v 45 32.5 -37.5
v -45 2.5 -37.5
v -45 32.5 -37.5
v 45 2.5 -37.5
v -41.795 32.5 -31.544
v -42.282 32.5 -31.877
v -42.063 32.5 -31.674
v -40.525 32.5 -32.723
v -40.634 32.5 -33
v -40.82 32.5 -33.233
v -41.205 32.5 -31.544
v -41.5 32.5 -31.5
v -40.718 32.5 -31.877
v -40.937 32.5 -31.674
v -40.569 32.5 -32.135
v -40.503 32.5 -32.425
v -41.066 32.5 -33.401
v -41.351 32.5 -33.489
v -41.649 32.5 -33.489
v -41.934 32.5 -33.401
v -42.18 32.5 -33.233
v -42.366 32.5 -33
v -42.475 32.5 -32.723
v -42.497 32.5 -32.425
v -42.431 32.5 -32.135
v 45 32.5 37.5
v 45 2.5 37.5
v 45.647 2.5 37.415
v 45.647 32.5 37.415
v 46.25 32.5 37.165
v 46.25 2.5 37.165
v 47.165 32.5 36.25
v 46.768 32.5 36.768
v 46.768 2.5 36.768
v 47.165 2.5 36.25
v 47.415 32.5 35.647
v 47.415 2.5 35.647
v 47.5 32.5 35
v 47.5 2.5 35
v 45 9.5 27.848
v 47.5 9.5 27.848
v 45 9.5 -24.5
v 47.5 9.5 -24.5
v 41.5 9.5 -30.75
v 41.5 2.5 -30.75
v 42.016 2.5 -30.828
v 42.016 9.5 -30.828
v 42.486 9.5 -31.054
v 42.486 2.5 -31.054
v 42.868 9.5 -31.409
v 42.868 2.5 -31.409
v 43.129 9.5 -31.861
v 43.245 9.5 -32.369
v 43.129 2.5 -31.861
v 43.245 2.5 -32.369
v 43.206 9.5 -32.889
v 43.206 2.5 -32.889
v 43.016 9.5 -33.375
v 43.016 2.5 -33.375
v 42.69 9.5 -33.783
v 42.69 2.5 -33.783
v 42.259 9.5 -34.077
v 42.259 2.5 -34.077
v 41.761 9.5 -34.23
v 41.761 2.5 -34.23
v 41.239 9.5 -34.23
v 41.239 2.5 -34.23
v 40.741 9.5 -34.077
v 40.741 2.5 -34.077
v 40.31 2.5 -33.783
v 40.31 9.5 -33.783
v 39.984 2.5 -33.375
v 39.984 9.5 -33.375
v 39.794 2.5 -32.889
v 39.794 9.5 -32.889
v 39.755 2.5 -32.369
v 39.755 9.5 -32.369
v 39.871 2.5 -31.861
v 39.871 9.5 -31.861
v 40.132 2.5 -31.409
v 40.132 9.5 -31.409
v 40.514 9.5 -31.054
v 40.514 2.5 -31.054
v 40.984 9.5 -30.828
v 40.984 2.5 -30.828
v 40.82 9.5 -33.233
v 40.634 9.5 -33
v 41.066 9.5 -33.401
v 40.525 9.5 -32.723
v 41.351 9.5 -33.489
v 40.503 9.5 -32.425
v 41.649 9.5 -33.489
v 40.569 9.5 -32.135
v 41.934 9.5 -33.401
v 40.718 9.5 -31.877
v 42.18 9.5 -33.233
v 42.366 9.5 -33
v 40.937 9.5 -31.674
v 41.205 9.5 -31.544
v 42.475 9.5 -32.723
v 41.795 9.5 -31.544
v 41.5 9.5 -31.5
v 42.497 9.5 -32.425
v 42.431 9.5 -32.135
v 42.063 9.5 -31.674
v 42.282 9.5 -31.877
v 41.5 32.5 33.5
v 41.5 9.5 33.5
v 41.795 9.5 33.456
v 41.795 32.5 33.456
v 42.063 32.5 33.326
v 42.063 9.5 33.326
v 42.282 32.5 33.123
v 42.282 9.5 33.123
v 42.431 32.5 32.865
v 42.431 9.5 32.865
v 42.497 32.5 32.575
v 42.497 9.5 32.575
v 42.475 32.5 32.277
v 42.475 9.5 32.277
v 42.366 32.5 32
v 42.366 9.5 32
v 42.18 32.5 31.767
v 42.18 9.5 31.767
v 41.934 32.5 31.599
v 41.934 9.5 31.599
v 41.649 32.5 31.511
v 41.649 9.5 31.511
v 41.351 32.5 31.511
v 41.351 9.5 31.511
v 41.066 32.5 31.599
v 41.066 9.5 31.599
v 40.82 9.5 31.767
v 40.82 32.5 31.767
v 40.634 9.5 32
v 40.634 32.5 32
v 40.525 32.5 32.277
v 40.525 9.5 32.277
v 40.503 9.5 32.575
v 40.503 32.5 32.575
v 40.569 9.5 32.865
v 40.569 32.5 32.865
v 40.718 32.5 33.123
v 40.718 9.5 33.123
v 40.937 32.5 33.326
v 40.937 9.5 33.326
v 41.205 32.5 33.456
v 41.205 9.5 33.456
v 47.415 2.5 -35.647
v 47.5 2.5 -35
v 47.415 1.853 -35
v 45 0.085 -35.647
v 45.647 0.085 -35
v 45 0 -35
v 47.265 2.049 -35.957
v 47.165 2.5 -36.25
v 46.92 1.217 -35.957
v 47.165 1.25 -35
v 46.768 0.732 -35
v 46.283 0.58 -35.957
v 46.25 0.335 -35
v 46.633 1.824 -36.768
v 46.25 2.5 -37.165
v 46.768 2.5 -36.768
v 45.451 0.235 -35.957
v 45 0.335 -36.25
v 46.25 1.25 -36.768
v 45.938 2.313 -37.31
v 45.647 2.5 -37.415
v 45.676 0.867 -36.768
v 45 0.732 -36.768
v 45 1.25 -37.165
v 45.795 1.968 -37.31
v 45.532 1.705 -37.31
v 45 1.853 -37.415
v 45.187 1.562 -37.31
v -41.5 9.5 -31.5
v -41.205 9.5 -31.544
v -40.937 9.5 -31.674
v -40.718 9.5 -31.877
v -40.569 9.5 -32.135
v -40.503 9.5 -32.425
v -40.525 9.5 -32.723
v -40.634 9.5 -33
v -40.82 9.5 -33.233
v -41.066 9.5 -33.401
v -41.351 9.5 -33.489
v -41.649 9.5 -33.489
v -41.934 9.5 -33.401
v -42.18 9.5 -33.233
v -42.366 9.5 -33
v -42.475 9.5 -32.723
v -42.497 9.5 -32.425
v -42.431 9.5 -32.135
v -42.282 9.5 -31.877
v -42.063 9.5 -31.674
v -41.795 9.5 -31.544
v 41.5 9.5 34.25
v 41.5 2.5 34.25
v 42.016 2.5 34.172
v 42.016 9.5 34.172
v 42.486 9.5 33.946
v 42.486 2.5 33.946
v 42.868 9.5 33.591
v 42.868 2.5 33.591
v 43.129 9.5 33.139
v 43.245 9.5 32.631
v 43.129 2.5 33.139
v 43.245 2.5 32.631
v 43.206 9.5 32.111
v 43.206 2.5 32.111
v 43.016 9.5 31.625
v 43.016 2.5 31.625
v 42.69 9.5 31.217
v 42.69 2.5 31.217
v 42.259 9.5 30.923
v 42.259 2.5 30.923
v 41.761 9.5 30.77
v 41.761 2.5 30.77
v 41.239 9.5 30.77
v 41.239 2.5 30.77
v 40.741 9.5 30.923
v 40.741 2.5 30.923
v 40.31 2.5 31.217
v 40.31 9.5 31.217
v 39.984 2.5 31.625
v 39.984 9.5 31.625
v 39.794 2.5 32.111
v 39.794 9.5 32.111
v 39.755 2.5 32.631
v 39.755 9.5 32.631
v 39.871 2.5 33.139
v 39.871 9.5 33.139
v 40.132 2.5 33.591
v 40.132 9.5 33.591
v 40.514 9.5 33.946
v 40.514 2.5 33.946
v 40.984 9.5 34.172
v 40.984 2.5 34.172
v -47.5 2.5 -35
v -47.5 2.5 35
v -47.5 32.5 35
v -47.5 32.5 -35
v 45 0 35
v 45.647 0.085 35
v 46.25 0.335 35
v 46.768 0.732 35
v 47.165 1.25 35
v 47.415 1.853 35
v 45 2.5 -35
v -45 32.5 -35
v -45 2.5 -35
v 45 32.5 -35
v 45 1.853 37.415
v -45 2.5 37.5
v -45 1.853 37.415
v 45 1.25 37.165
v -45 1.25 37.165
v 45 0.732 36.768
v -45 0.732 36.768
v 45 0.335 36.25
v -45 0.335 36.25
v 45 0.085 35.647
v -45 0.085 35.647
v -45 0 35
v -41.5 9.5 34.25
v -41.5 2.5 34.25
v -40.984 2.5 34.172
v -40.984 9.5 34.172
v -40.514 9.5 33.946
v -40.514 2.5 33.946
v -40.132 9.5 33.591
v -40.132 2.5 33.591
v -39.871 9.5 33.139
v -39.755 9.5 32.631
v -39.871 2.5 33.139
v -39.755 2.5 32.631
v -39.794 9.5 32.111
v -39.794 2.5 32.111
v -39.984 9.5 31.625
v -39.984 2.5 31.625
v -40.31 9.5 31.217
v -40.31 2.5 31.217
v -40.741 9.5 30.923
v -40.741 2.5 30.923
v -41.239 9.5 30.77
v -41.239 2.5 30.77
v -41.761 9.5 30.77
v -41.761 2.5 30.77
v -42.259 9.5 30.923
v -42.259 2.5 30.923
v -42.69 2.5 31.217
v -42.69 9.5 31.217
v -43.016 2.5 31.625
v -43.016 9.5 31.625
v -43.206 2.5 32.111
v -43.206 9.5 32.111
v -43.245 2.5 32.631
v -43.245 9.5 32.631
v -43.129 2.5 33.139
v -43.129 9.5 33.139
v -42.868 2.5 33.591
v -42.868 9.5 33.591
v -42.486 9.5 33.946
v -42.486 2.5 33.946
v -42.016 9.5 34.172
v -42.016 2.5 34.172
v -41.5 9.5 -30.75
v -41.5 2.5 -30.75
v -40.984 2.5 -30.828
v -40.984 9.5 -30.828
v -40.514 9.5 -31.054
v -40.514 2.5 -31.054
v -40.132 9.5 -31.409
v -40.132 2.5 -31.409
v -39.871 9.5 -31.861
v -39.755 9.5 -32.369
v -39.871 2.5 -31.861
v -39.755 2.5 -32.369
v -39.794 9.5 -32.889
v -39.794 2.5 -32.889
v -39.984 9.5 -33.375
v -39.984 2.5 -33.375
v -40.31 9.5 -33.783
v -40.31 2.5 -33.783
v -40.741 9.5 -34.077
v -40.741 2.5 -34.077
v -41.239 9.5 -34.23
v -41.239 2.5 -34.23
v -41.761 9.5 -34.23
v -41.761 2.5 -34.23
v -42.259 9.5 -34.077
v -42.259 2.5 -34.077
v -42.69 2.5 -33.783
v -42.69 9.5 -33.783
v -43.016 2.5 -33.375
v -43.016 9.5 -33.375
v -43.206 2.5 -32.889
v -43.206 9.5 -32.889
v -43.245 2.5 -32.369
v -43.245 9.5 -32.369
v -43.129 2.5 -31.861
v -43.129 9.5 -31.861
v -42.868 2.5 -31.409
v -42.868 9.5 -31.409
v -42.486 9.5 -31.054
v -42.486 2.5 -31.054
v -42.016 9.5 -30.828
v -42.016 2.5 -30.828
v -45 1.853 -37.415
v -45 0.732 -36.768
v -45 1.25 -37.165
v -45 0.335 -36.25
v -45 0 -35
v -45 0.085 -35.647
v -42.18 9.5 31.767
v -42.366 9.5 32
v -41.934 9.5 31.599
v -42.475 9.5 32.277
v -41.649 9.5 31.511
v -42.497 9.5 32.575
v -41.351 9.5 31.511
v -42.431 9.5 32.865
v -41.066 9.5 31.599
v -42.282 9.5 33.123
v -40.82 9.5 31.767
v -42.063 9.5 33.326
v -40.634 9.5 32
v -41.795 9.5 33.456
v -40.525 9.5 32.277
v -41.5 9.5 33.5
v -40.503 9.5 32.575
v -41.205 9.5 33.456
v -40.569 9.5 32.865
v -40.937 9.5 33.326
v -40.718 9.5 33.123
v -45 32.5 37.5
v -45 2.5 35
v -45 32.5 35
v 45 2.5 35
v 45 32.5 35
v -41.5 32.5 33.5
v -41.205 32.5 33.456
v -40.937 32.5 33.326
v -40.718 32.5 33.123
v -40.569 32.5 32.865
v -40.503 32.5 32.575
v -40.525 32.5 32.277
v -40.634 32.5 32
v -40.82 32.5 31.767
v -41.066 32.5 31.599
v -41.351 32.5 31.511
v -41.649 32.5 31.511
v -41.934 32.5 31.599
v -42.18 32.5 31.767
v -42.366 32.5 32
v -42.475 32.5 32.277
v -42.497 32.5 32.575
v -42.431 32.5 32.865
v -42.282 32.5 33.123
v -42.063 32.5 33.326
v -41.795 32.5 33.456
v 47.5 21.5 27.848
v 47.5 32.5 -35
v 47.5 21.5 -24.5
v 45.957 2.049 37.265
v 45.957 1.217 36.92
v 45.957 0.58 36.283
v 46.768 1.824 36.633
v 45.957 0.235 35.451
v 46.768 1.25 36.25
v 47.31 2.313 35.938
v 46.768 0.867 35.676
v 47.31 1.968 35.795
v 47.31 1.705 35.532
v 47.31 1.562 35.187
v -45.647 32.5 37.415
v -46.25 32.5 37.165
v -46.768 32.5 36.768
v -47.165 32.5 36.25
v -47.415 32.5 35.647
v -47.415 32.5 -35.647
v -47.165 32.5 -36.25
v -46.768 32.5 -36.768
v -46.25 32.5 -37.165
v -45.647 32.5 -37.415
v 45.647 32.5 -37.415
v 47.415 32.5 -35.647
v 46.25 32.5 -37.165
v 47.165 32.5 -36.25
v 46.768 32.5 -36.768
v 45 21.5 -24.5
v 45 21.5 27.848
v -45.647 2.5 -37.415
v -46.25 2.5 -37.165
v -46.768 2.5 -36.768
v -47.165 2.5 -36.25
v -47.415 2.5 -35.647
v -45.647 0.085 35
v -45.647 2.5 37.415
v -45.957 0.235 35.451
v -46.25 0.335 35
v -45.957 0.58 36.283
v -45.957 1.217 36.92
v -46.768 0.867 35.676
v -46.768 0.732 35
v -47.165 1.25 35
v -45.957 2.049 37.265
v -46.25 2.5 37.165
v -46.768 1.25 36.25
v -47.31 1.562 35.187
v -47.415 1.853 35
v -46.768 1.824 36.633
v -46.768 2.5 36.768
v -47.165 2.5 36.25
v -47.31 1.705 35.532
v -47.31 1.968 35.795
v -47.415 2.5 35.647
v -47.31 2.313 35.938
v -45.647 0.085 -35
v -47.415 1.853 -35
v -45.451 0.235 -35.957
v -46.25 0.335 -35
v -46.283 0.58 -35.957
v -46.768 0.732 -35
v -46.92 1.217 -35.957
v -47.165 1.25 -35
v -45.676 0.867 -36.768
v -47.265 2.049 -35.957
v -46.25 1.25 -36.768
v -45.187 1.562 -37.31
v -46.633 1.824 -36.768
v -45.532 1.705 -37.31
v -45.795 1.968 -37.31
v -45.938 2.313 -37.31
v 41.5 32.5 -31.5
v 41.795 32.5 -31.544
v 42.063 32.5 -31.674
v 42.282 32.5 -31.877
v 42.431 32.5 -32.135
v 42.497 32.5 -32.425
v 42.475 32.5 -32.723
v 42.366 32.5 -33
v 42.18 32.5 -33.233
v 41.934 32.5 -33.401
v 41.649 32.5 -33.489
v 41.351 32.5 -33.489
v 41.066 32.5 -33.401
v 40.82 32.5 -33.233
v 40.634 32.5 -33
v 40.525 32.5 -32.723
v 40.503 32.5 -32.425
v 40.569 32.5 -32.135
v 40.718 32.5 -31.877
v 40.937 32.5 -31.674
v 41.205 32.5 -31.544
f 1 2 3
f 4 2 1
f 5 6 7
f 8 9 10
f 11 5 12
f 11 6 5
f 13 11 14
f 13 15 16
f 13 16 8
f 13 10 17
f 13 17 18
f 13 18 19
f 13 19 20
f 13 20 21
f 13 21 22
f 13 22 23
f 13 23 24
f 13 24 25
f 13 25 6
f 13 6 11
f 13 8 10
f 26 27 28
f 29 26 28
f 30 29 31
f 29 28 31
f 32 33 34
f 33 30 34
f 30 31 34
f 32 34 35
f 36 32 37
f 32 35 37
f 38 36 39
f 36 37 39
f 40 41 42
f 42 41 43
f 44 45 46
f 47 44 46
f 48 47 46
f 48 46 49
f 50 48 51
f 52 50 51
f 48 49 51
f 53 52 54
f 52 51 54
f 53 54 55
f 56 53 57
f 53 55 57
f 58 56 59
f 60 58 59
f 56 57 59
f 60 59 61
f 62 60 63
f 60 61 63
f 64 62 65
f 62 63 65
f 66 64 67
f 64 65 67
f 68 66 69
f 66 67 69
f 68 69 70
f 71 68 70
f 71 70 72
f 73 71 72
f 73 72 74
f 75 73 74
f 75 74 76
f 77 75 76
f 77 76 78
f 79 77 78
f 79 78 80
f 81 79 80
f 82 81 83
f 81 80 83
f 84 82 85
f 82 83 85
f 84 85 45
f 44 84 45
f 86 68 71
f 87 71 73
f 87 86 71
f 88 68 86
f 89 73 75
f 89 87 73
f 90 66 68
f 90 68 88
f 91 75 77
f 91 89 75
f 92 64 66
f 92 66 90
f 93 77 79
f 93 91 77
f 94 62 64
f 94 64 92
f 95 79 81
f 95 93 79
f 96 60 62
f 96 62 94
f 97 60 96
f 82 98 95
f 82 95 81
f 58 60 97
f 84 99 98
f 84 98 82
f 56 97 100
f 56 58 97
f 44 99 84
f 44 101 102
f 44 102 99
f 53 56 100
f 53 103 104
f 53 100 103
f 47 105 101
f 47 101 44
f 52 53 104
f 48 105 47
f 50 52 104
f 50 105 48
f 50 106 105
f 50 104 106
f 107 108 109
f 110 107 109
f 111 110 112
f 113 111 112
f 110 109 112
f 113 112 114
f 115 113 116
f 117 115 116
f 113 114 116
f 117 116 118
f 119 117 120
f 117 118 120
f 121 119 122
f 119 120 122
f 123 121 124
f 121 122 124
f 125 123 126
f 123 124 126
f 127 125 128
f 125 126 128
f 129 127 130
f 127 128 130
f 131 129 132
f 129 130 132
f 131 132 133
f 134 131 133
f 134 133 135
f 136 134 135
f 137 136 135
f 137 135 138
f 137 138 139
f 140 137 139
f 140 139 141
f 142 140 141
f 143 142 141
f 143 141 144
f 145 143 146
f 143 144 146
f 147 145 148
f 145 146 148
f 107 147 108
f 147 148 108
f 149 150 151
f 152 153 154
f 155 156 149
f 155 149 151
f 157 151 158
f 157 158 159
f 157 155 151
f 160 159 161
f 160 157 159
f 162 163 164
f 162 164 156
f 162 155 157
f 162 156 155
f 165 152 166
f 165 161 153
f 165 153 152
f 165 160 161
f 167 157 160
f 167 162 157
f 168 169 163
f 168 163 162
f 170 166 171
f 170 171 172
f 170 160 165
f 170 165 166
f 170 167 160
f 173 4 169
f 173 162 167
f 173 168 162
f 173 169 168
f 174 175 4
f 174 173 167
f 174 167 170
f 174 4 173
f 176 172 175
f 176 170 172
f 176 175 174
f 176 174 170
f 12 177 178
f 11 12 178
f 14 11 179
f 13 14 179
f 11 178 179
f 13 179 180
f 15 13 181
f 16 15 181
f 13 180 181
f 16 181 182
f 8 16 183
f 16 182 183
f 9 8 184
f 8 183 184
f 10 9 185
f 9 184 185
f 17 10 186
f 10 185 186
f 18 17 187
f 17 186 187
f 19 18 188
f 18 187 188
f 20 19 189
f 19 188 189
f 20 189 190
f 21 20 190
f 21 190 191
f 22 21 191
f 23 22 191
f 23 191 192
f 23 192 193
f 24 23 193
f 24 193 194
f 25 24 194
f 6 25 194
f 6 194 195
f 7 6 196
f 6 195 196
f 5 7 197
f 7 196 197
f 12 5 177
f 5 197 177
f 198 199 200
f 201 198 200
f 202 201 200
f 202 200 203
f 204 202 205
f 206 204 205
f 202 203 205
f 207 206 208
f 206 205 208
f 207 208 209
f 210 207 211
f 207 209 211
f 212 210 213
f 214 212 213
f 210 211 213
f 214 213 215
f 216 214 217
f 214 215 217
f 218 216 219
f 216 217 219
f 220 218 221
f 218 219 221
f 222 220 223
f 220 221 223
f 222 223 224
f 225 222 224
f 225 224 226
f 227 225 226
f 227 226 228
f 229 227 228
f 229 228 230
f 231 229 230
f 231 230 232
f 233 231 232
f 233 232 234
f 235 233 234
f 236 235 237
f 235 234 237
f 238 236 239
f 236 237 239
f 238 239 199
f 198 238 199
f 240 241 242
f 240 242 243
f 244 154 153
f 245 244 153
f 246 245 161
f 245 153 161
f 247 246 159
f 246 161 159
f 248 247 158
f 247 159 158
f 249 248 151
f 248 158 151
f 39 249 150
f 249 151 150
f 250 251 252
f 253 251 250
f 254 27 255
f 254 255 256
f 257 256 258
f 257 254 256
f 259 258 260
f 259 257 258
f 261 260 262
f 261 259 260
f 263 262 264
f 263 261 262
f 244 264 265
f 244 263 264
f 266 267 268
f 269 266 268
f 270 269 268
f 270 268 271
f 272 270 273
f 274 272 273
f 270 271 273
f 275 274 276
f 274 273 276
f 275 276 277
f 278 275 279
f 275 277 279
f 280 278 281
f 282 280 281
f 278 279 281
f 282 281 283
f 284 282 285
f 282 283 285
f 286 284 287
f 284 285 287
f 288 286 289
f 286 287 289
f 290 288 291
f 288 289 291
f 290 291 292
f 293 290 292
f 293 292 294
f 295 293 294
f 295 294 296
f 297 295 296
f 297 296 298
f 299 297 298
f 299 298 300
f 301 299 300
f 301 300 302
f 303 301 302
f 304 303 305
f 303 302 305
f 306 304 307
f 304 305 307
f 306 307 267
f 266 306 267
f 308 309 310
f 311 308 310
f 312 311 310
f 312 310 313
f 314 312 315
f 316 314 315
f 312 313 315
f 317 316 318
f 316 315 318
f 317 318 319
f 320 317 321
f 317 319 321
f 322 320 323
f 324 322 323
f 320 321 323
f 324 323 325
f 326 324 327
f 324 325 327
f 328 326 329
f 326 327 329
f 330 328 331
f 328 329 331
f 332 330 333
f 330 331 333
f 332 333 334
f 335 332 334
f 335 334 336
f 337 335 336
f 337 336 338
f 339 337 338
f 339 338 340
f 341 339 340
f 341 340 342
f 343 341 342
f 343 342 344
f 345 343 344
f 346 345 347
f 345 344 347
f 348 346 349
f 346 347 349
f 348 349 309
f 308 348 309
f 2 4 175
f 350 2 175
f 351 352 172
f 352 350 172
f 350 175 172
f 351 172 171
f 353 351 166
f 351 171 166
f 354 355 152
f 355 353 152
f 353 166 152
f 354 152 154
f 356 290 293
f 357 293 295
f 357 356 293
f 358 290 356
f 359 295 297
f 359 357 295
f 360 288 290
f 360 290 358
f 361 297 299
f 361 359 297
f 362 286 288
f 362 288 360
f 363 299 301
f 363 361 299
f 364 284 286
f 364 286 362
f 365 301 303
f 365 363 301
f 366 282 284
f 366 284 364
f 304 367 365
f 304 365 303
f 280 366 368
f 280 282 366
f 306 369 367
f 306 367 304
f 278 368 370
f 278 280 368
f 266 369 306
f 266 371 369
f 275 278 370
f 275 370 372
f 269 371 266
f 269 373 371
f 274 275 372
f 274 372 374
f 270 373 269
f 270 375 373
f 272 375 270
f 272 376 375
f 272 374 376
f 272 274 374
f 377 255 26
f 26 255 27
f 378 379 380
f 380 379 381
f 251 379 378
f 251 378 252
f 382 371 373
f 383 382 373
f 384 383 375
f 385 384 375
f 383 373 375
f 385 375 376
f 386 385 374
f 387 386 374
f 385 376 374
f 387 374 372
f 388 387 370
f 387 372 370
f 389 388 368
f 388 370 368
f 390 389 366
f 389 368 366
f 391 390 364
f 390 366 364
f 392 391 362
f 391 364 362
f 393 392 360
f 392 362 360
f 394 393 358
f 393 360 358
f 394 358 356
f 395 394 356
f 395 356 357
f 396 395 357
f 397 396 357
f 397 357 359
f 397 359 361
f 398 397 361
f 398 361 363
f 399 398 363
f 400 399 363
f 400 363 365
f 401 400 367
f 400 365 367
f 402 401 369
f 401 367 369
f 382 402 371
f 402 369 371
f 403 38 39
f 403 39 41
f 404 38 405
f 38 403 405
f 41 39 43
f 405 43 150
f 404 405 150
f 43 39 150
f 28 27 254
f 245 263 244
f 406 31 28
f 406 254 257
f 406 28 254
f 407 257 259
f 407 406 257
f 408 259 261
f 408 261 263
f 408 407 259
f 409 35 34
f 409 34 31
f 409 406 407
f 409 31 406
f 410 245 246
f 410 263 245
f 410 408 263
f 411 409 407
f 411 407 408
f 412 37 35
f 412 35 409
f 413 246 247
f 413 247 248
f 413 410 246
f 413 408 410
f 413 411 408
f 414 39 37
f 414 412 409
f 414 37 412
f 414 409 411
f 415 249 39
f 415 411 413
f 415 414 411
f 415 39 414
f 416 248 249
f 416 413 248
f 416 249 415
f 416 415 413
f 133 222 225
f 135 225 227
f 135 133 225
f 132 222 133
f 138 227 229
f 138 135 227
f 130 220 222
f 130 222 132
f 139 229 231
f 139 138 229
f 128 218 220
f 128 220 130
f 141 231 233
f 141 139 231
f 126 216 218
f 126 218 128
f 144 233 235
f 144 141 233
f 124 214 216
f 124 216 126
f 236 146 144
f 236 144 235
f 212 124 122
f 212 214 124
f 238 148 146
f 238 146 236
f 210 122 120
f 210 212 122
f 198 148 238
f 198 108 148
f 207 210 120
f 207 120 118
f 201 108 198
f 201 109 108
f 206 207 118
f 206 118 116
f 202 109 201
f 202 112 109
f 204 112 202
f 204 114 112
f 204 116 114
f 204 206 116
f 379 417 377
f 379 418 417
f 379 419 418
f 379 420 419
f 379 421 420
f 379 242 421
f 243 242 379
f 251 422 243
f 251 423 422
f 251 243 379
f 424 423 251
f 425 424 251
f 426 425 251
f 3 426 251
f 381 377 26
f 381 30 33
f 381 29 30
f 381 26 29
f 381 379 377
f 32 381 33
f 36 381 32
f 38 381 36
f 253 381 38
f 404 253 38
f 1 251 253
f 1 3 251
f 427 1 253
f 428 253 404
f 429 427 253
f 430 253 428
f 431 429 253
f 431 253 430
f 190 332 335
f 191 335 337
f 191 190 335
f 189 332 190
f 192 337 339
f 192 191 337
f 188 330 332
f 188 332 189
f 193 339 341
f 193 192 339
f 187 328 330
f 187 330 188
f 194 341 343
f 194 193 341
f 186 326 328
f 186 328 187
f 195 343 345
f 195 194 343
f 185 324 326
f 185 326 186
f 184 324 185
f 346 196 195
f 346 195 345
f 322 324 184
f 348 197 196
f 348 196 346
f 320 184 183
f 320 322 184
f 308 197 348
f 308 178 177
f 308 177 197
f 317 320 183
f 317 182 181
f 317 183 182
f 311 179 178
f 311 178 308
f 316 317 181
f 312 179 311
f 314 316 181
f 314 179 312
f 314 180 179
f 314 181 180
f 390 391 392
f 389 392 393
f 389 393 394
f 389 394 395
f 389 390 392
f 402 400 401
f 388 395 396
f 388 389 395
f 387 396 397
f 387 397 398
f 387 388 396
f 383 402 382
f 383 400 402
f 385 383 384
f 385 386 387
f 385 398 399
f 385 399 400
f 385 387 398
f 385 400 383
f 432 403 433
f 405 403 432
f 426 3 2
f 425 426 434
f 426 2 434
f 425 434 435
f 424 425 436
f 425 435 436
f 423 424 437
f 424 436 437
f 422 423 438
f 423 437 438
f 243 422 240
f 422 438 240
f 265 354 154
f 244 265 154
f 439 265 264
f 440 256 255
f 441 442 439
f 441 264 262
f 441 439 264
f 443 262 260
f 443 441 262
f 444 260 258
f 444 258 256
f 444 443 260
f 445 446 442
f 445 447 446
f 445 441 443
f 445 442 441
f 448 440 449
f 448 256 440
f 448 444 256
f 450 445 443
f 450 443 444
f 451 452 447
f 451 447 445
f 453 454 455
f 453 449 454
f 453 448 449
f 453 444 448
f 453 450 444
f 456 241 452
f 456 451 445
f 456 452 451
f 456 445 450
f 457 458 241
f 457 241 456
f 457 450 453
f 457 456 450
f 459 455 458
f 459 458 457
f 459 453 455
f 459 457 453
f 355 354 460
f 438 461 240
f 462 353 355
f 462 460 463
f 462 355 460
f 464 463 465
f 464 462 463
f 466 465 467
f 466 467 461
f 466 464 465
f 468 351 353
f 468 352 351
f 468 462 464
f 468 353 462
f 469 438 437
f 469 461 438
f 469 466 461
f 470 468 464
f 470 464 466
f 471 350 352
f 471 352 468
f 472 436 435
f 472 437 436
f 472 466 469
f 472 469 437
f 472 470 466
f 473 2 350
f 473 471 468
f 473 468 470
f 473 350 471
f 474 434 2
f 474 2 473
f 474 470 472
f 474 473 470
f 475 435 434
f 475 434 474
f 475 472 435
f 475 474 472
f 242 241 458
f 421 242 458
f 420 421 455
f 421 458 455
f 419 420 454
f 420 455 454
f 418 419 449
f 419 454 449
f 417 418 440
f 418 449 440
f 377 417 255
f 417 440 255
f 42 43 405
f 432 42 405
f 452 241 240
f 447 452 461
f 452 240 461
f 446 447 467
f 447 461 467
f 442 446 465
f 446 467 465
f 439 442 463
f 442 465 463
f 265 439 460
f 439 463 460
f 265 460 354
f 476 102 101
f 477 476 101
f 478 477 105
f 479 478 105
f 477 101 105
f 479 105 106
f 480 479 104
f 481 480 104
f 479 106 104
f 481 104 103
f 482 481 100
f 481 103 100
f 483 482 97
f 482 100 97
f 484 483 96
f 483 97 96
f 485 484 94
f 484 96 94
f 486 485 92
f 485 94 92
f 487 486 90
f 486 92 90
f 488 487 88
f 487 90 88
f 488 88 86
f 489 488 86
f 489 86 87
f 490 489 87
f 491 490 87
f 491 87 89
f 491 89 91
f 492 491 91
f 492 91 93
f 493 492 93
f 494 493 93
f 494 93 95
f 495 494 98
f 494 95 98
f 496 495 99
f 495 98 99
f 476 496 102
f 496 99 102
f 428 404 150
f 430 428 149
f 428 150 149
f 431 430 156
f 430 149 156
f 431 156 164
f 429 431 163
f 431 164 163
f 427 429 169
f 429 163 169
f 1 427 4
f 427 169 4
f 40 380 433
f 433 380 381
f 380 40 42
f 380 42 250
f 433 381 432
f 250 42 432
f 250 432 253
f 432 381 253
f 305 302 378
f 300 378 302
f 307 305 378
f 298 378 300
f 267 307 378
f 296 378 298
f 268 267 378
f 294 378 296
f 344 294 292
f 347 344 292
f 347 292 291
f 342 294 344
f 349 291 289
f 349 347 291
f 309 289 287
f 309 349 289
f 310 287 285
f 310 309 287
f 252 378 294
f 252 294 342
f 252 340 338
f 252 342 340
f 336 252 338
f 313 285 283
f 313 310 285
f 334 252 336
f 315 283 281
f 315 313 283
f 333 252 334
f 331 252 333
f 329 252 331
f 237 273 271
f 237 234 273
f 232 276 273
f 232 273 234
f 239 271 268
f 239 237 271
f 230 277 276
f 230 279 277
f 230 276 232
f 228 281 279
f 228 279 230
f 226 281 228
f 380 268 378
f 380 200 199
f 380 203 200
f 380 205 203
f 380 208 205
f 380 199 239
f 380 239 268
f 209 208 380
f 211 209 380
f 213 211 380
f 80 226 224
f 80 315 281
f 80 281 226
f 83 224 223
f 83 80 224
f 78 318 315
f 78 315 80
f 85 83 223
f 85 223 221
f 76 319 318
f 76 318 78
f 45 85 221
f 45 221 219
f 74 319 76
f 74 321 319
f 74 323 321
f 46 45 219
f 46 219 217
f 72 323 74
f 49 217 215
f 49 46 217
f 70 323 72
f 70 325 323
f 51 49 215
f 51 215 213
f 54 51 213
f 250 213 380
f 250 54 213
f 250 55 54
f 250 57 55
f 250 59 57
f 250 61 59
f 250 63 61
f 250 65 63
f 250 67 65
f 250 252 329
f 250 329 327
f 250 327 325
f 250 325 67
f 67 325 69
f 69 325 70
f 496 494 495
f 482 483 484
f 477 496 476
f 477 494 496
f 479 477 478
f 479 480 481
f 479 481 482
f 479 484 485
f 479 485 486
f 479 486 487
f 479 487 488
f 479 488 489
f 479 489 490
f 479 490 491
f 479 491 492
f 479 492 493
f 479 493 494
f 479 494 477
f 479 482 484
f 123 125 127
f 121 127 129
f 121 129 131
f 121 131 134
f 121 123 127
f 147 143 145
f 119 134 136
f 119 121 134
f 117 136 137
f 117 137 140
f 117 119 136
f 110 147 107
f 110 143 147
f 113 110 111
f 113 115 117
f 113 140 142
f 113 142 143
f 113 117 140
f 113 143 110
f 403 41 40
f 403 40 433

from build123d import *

# Parameters (mm, degrees)
SKETCH1_W           = 95
SKETCH1_H           = 75
BOSS_EXTRUDE1_DEPTH = 32.5
SKETCH2_W           = 90
SKETCH2_H           = 70
CUT_EXTRUDE1_DEPTH  = 30
SKETCH3_R           = 1.75
BOSS_EXTRUDE2_DEPTH = 7
SKETCH4_R           = 1
BOSS_EXTRUDE3_DEPTH = 23
SKETCH5_W           = 52.348164398
SKETCH5_H           = 12
CUT_EXTRUDE2_DEPTH  = 7
FILLET1_R           = 2.5
FILLET2_R           = 2.5
FILLET3_R           = 2.5
FILLET4_R           = 2.5
FILLET5_R           = 2.5


with BuildPart() as part:
    # Sketch1 → Boss-Extrude1 (new body)
    with BuildSketch(Plane(origin=(0, 0, 0), x_dir=(1, 0, 0), z_dir=(0, 1, 0))):
        Rectangle(SKETCH1_W, SKETCH1_H)
    extrude(amount=BOSS_EXTRUDE1_DEPTH)

    # Sketch2 → Cut-Extrude1 (cut)
    with BuildSketch(Plane(origin=(0, 32.5, 0), x_dir=(1, 0, 0), z_dir=(0, 1, 0))):
        Rectangle(SKETCH2_W, SKETCH2_H)
    extrude(amount=-CUT_EXTRUDE1_DEPTH, mode=Mode.SUBTRACT)

    # Sketch3 → Boss-Extrude2 (add)
    with BuildSketch(Plane(origin=(0, 2.5, 0), x_dir=(1, 0, 0), z_dir=(0, 1, 0))):
        with Locations(Location((-41.5, 32.5, 0), (0, 0, 270))):
            Circle(SKETCH3_R)
        with Locations(Location((41.5, 32.5, 0), (0, 0, 270))):
            Circle(SKETCH3_R)
        with Locations(Location((41.5, -32.5, 0), (0, 0, 270))):
            Circle(SKETCH3_R)
        with Locations(Location((-41.5, -32.5, 0), (0, 0, 270))):
            Circle(SKETCH3_R)
    extrude(amount=BOSS_EXTRUDE2_DEPTH)

    # Sketch4 → Boss-Extrude3 (add)
    with BuildSketch(Plane(origin=(0, 9.5, 0), x_dir=(1, 0, 0), z_dir=(0, 1, 0))):
        with Locations(Location((-41.5, 32.5, 0), (0, 0, 270))):
            Circle(SKETCH4_R)
        with Locations(Location((41.5, 32.5, 0), (0, 0, 270))):
            Circle(SKETCH4_R)
        with Locations(Location((41.5, -32.5, 0), (0, 0, 270))):
            Circle(SKETCH4_R)
        with Locations(Location((-41.5, -32.5, 0), (0, 0, 270))):
            Circle(SKETCH4_R)
    extrude(amount=BOSS_EXTRUDE3_DEPTH)

    # Sketch5 → Cut-Extrude2 (cut)
    with BuildSketch(Plane(origin=(47.5, 0, 0), x_dir=(0, 0, -1), z_dir=(1, 0, 0))):
        with Locations((-1.674082199, 15.5)):
            Rectangle(SKETCH5_W, SKETCH5_H)
    extrude(amount=-CUT_EXTRUDE2_DEPTH, mode=Mode.SUBTRACT)

    # Fillet1
    fillet1_edges = [part.edges().sort_by_distance(p)[0] for p in [
        (0, 0, -37.5),
        (47.5, 0, 0),
        (0, 0, 37.5),
        (-47.5, 0, 0),
    ]]
    fillet(fillet1_edges, radius=FILLET1_R)

    # Fillet2
    # the kernel refuses this fillet: 2.5 mm, written as the material it takes off along each edge
    with BuildSketch(Plane(origin=(45, 2.5, 35), x_dir=(0, 0, 1), z_dir=(1, 0, 0))) as fillet2_piece_1_section:
        Polygon((0, 0), (FILLET2_R, 0), (FILLET2_R, FILLET2_R), (0, FILLET2_R), align=None)
    fillet2_piece_1 = extrude(amount=FILLET2_R, mode=Mode.PRIVATE)
    fillet2_piece_1 = fillet2_piece_1 - Plane(origin=(45, 2.5, 35), x_dir=(0, 0.7071067811865475, -0.7071067811865475), z_dir=(1, 0, 0)) * Sphere(FILLET2_R, mode=Mode.PRIVATE)
    add(fillet2_piece_1, mode=Mode.SUBTRACT)
    with BuildSketch(Plane(origin=(47.5, 2.5, 37.5), x_dir=(0, 0, -1), z_dir=(0, 1, 0))) as fillet2_piece_2:
        with BuildLine():
            CenterArc((FILLET2_R, FILLET2_R), FILLET2_R, 180, 90)
            Line((0, FILLET2_R), (0, 0))
            Line((0, 0), (FILLET2_R, 0))
        make_face()
    extrude(amount=36.25, mode=Mode.SUBTRACT)

    # Fillet3
    # the kernel refuses this fillet: 2.5 mm, written as the material it takes off along each edge
    with BuildSketch(Plane(origin=(45, 2.5, -35), x_dir=(1, 0, 0), z_dir=(0, 0, -1))) as fillet3_piece_1_section:
        Polygon((0, 0), (FILLET3_R, 0), (FILLET3_R, FILLET3_R), (0, FILLET3_R), align=None)
    fillet3_piece_1 = extrude(amount=FILLET3_R, mode=Mode.PRIVATE)
    fillet3_piece_1 = fillet3_piece_1 - Plane(origin=(45, 2.5, -35), x_dir=(-0.7071067811865475, 0.7071067811865475, 0), z_dir=(0, 0, -1)) * Sphere(FILLET3_R, mode=Mode.PRIVATE)
    add(fillet3_piece_1, mode=Mode.SUBTRACT)
    with BuildSketch(Plane(origin=(47.5, 2.5, -37.5), x_dir=(-1, 0, 0), z_dir=(0, 1, 0))) as fillet3_piece_2:
        with BuildLine():
            CenterArc((FILLET3_R, FILLET3_R), FILLET3_R, 180, 90)
            Line((0, FILLET3_R), (0, 0))
            Line((0, 0), (FILLET3_R, 0))
        make_face()
    extrude(amount=36.25, mode=Mode.SUBTRACT)

    # Fillet4
    # the kernel refuses this fillet: 2.5 mm, written as the material it takes off along each edge
    with BuildSketch(Plane(origin=(-45, 2.5, -35), x_dir=(-1, 0, 0), z_dir=(0, 0, -1))) as fillet4_piece_1_section:
        Polygon((0, 0), (FILLET4_R, 0), (FILLET4_R, -FILLET4_R), (0, -FILLET4_R), align=None)
    fillet4_piece_1 = extrude(amount=FILLET4_R, mode=Mode.PRIVATE)
    fillet4_piece_1 = fillet4_piece_1 - Plane(origin=(-45, 2.5, -35), x_dir=(0.7071067811865475, 0.7071067811865475, 0), z_dir=(0, 0, -1)) * Sphere(FILLET4_R, mode=Mode.PRIVATE)
    add(fillet4_piece_1, mode=Mode.SUBTRACT)
    with BuildSketch(Plane(origin=(-47.5, 2.5, -37.5), x_dir=(1, 0, 0), z_dir=(0, 1, 0))) as fillet4_piece_2:
        with BuildLine():
            CenterArc((FILLET4_R, -FILLET4_R), FILLET4_R, 90, 90)
            Line((0, -FILLET4_R), (0, 0))
            Line((0, 0), (FILLET4_R, 0))
        make_face()
    extrude(amount=36.25, mode=Mode.SUBTRACT)

    # Fillet5
    # the kernel refuses this fillet: 2.5 mm, written as the material it takes off along each edge
    with BuildSketch(Plane(origin=(-45, 2.5, 35), x_dir=(0, 0, 1), z_dir=(-1, 0, 0))) as fillet5_piece_1_section:
        Polygon((0, 0), (FILLET5_R, 0), (FILLET5_R, -FILLET5_R), (0, -FILLET5_R), align=None)
    fillet5_piece_1 = extrude(amount=FILLET5_R, mode=Mode.PRIVATE)
    fillet5_piece_1 = fillet5_piece_1 - Plane(origin=(-45, 2.5, 35), x_dir=(0, 0.7071067811865475, -0.7071067811865475), z_dir=(-1, 0, 0)) * Sphere(FILLET5_R, mode=Mode.PRIVATE)
    add(fillet5_piece_1, mode=Mode.SUBTRACT)
    with BuildSketch(Plane(origin=(-47.5, 2.5, 37.5), x_dir=(0, 0, -1), z_dir=(0, 1, 0))) as fillet5_piece_2:
        with BuildLine():
            CenterArc((FILLET5_R, -FILLET5_R), FILLET5_R, 90, 90)
            Line((0, -FILLET5_R), (0, 0))
            Line((0, 0), (FILLET5_R, 0))
        make_face()
    extrude(amount=36.25, mode=Mode.SUBTRACT)


solid = part.part
